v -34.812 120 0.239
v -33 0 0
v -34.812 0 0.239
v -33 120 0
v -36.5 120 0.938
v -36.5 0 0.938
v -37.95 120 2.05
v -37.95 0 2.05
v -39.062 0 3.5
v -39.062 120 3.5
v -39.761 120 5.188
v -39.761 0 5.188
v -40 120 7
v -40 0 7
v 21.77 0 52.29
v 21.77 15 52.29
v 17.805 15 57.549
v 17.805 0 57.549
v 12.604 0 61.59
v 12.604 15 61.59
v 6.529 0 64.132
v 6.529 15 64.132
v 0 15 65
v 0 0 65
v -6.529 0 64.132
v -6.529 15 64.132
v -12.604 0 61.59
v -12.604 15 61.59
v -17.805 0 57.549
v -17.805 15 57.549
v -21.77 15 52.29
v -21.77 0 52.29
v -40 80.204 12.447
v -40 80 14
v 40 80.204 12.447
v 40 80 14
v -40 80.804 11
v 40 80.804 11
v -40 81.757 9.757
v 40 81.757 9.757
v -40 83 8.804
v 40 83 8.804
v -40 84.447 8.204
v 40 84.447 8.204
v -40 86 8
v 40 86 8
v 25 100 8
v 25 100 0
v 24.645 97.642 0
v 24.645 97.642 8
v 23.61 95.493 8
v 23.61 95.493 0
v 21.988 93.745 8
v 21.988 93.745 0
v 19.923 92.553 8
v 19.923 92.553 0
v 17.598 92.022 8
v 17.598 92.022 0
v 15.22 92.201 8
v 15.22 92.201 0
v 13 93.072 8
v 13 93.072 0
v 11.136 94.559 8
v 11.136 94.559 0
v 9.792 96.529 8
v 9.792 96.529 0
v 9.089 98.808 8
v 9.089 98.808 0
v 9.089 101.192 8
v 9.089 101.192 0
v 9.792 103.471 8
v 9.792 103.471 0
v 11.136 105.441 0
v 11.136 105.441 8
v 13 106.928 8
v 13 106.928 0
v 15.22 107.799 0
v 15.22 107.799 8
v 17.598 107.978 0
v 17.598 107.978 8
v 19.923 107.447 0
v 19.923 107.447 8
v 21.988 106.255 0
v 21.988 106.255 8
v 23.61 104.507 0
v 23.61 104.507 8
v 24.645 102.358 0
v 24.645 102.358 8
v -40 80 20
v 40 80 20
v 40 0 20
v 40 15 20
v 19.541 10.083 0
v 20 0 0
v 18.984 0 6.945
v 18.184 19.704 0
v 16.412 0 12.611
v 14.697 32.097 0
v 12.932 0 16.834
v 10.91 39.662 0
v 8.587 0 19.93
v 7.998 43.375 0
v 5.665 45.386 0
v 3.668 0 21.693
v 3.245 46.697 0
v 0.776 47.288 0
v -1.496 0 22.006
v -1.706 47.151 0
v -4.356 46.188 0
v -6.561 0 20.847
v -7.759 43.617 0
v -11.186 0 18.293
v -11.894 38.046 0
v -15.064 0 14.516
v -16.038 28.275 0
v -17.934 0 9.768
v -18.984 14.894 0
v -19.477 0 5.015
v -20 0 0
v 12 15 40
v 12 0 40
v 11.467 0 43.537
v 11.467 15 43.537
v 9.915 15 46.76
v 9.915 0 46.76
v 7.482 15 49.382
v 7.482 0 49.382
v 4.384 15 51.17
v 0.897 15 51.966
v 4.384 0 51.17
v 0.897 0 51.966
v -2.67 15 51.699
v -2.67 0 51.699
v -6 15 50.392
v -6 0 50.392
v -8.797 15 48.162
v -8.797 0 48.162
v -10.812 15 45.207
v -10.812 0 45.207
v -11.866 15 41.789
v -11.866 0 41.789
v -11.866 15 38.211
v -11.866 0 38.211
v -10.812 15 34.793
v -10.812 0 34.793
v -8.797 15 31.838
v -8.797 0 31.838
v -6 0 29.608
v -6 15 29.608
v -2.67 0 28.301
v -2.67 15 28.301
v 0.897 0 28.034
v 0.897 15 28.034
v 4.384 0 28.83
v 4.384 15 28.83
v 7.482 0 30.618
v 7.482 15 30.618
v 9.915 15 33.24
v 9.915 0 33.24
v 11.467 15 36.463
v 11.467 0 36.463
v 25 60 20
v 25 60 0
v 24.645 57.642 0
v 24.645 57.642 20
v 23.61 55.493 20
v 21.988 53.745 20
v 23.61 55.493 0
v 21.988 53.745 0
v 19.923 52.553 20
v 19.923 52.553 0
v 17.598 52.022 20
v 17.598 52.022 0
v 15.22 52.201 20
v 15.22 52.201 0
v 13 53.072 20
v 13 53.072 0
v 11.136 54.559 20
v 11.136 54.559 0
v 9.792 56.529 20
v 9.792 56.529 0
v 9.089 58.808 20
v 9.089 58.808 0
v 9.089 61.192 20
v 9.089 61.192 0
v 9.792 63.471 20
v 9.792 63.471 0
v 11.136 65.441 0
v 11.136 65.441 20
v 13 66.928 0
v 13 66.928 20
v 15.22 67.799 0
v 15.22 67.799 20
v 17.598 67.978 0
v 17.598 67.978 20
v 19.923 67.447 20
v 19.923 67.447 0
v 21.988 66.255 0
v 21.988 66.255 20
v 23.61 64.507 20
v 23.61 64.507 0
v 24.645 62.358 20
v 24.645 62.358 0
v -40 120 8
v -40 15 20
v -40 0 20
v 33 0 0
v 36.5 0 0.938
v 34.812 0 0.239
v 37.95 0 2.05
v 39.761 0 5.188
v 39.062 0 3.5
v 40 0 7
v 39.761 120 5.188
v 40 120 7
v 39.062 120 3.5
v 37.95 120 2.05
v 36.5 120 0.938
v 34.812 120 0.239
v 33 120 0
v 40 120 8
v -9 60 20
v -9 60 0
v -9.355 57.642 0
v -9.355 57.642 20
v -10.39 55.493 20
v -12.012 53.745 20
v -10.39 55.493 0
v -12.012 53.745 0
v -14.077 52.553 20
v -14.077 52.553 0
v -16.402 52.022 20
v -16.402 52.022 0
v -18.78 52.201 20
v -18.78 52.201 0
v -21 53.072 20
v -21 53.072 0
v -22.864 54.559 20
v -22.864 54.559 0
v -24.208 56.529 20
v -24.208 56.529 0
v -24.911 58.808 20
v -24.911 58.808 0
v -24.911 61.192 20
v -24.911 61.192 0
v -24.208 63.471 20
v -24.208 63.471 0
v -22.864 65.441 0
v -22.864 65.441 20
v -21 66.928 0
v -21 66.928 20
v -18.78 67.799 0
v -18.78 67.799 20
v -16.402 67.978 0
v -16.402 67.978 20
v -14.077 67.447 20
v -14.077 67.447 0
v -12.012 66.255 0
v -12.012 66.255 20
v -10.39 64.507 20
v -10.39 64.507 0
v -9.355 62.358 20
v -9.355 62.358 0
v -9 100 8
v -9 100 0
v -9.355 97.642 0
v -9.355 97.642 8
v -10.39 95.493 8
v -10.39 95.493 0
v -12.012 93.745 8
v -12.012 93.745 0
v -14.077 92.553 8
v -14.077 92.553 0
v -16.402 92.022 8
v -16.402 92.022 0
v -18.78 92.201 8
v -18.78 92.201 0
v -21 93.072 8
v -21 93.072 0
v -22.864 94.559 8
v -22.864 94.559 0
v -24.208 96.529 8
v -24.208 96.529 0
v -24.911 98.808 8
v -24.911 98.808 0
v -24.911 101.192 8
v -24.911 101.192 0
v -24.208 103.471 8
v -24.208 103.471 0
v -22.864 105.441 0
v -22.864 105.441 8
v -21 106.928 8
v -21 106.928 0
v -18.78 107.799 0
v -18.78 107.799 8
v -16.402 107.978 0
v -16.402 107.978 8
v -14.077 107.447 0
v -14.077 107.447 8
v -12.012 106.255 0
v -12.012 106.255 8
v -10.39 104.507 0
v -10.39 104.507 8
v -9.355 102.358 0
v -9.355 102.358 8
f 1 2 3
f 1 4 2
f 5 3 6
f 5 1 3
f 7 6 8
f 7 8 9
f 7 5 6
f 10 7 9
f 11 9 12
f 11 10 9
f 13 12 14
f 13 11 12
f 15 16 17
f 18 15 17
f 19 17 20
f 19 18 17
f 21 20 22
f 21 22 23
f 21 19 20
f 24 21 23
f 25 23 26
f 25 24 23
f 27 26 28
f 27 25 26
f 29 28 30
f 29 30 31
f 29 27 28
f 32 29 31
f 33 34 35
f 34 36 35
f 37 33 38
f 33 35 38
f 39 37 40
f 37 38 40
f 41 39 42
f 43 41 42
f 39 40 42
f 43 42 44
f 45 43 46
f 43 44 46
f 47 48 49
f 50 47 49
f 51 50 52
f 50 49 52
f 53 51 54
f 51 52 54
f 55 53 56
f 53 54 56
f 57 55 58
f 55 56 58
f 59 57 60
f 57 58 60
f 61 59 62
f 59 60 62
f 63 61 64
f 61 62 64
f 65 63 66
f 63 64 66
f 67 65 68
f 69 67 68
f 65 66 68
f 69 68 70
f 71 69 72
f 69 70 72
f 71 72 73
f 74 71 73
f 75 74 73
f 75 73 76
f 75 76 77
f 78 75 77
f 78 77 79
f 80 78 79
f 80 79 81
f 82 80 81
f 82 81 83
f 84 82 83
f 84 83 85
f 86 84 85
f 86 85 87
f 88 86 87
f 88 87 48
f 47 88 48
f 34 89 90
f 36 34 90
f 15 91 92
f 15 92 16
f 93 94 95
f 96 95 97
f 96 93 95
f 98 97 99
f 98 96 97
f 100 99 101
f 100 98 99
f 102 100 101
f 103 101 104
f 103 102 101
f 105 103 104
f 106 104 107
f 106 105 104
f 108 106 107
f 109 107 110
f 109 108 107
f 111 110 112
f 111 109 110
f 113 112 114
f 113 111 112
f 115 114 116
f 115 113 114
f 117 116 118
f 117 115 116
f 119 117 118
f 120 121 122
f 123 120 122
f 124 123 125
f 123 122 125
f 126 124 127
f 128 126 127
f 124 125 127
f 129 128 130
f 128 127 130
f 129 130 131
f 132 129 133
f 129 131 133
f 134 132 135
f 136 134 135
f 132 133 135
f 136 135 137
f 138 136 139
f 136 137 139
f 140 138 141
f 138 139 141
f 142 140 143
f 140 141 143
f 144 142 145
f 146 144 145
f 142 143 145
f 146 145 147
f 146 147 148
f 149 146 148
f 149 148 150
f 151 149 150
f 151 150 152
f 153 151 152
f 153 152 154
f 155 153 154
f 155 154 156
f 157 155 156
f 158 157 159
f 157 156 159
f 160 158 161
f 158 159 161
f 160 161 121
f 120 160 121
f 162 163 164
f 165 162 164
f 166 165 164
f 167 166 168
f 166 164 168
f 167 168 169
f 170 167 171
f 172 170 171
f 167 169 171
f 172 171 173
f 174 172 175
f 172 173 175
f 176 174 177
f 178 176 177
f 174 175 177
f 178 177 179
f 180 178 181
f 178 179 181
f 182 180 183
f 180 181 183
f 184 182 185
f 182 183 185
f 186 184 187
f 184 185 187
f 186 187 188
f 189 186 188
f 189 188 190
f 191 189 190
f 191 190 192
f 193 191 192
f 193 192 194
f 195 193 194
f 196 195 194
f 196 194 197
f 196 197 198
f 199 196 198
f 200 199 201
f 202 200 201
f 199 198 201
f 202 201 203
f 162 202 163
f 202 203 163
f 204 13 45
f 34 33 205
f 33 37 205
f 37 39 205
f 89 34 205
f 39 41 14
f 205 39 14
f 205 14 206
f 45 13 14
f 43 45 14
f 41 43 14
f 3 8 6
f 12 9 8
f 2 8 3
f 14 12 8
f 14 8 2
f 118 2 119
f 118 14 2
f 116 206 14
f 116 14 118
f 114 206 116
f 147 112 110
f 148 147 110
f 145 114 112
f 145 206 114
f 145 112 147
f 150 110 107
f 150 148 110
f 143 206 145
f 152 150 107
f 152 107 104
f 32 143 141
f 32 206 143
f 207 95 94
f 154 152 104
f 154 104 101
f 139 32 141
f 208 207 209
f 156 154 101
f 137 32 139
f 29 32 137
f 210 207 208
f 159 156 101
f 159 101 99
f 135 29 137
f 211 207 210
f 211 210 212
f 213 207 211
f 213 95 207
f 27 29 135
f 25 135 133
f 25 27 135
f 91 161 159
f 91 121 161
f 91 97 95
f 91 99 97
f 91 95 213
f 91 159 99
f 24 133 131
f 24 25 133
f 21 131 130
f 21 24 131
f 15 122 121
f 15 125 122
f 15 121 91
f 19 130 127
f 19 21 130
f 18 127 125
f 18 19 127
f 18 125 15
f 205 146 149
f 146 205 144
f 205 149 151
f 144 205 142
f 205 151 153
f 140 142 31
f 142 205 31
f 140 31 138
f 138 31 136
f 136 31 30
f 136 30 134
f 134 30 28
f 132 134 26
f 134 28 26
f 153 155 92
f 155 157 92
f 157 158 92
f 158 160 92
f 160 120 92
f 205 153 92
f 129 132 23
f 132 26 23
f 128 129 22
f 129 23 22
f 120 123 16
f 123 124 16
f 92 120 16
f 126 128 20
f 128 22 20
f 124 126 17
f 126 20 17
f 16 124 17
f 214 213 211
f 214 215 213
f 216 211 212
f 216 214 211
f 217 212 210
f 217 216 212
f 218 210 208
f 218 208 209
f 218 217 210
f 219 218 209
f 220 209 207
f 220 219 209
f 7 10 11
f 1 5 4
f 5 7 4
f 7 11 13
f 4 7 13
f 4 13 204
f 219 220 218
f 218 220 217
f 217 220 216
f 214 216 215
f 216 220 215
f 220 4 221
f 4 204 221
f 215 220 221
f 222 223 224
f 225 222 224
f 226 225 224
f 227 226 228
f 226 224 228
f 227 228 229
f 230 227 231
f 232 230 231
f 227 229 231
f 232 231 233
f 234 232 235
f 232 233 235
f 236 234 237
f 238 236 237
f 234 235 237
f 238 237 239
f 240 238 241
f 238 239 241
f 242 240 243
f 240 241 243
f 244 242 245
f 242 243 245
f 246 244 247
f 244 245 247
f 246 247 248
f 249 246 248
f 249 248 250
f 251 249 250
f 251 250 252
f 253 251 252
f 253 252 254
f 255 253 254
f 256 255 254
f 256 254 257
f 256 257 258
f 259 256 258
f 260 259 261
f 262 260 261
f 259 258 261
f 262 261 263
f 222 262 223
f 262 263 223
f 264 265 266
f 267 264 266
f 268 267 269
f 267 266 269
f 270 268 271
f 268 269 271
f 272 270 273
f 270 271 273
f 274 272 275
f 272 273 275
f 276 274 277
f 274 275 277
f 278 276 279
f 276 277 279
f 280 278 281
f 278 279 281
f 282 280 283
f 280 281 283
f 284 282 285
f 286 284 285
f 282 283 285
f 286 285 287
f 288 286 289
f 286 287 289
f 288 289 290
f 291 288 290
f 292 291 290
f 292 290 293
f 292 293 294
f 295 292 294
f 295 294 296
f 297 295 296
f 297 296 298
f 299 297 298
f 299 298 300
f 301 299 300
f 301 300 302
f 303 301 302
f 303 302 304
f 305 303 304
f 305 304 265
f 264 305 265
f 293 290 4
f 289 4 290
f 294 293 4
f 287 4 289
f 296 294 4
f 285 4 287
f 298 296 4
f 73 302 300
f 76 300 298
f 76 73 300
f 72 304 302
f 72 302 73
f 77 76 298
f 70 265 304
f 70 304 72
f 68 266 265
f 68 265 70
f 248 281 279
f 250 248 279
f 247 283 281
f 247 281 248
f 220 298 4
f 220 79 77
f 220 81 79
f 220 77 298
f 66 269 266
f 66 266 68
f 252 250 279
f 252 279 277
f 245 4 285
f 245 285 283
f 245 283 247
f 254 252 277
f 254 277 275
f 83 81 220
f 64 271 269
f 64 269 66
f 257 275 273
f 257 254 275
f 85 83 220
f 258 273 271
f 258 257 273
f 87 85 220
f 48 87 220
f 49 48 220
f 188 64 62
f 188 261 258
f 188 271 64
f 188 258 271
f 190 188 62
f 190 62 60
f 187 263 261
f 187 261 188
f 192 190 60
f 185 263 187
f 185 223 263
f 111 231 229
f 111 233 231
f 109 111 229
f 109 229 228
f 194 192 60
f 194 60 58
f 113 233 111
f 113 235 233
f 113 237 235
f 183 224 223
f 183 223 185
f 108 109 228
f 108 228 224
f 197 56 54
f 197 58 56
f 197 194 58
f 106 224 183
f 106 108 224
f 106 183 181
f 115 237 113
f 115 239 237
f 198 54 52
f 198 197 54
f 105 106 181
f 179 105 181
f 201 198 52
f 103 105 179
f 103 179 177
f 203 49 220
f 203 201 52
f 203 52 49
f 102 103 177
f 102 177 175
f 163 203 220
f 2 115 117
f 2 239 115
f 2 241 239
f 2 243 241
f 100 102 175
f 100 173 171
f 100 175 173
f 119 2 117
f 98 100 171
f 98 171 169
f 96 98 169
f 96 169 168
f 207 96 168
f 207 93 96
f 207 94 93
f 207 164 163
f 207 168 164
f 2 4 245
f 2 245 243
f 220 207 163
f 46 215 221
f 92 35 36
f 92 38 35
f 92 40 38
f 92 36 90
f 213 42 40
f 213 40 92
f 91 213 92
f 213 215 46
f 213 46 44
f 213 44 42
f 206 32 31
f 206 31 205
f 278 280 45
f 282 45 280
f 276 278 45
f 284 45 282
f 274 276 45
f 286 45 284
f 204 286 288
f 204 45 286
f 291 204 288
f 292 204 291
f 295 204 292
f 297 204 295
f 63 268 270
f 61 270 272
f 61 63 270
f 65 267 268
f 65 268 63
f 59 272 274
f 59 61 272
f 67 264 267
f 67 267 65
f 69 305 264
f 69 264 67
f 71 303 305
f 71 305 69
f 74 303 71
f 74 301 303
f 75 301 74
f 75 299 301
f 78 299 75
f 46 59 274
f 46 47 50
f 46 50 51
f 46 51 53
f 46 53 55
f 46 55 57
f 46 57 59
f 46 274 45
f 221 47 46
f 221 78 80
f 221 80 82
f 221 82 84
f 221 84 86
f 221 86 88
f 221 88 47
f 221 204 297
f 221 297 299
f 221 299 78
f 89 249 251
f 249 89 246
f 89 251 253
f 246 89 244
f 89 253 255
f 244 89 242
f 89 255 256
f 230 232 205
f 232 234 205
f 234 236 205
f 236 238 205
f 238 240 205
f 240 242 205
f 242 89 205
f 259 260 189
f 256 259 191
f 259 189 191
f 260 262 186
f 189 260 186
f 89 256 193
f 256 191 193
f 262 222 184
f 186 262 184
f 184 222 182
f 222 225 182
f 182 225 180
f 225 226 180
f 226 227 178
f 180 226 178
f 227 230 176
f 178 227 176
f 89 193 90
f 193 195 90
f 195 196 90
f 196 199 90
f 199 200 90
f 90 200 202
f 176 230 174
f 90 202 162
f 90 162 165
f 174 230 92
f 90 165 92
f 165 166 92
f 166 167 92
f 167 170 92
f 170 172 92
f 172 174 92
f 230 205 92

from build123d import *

# Parameters (mm, degrees)
F0_W           = 80
F0_H           = 20
F1_DEPTH       = 120
F0_R           = 12
F2_DEPTH       = 15
F3_W           = 80
F3_H           = 40
F4_DEPTH       = 12
F5_R           = 6
F6_R           = 7
F7_R           = 8
F8_DEPTH       = 20
F10_R          = 20
F11_DEPTH      = 108.7579344444
F11_DEPTH_BACK = 27.4711870131


with BuildPart() as f1:
    # F0 (on Front) → F1 (new body)
    with BuildSketch(Plane.XZ):
        with Locations((0, 10)):
            Rectangle(F0_W, F0_H)
    extrude(amount=-F1_DEPTH)

    # F0 (on Front) → F2 (join)
    with BuildSketch(Plane.XZ):
        with BuildLine():
            Line((40, 20), (21.7702481089, 52.2904962177))
            ThreePointArc((21.7702481089, 52.2904962177), (0, 65), (-21.7702481089, 52.2904962177))
            Line((-21.7702481089, 52.2904962177), (-40, 20))
            Line((-40, 20), (40, 20))
        make_face()
        with Locations((0, 40)):
            Circle(F0_R, mode=Mode.SUBTRACT)
    extrude(amount=-F2_DEPTH)

    # F3 (on face) → F4 (cut)
    with BuildSketch(Plane.XY.offset(20)):
        with Locations((0, 100)):
            Rectangle(F3_W, F3_H)
    extrude(amount=-F4_DEPTH, mode=Mode.SUBTRACT)

    # F5
    f5_edges = [f1.edges().sort_by_distance(p)[0] for p in [
        (0, 80, 8),
    ]]
    fillet(f5_edges, radius=F5_R)

    # F6
    f6_edges = [f1.edges().sort_by_distance(p)[0] for p in [
        (40, 60, 0),
        (-40, 60, 0),
    ]]
    fillet(f6_edges, radius=F6_R)

    # F7 (on face) → F8 (cut, through all)
    with BuildSketch(Plane(origin=(0, 0, 0), x_dir=(1, 0, 0), z_dir=(0, 0, -1))):
        with Locations((17, -60)):
            Circle(F7_R)
        with Locations((17, -100)):
            Circle(F7_R)
        with Locations((-17, -100)):
            Circle(F7_R)
        with Locations((-17, -60)):
            Circle(F7_R)
    extrude(amount=-F8_DEPTH, mode=Mode.SUBTRACT)

    # F10 (on line) → F11 (cut, two sides)
    with BuildSketch(Plane(origin=(0, 0, 0), x_dir=(1, 0, 0), z_dir=(0, -0.906307787, 0.4226182617))) as f11_sk:
        Circle(F10_R)
    extrude(amount=-F11_DEPTH, mode=Mode.SUBTRACT)
    extrude(f11_sk.sketch, amount=F11_DEPTH_BACK, mode=Mode.SUBTRACT)


solid = f1.part
